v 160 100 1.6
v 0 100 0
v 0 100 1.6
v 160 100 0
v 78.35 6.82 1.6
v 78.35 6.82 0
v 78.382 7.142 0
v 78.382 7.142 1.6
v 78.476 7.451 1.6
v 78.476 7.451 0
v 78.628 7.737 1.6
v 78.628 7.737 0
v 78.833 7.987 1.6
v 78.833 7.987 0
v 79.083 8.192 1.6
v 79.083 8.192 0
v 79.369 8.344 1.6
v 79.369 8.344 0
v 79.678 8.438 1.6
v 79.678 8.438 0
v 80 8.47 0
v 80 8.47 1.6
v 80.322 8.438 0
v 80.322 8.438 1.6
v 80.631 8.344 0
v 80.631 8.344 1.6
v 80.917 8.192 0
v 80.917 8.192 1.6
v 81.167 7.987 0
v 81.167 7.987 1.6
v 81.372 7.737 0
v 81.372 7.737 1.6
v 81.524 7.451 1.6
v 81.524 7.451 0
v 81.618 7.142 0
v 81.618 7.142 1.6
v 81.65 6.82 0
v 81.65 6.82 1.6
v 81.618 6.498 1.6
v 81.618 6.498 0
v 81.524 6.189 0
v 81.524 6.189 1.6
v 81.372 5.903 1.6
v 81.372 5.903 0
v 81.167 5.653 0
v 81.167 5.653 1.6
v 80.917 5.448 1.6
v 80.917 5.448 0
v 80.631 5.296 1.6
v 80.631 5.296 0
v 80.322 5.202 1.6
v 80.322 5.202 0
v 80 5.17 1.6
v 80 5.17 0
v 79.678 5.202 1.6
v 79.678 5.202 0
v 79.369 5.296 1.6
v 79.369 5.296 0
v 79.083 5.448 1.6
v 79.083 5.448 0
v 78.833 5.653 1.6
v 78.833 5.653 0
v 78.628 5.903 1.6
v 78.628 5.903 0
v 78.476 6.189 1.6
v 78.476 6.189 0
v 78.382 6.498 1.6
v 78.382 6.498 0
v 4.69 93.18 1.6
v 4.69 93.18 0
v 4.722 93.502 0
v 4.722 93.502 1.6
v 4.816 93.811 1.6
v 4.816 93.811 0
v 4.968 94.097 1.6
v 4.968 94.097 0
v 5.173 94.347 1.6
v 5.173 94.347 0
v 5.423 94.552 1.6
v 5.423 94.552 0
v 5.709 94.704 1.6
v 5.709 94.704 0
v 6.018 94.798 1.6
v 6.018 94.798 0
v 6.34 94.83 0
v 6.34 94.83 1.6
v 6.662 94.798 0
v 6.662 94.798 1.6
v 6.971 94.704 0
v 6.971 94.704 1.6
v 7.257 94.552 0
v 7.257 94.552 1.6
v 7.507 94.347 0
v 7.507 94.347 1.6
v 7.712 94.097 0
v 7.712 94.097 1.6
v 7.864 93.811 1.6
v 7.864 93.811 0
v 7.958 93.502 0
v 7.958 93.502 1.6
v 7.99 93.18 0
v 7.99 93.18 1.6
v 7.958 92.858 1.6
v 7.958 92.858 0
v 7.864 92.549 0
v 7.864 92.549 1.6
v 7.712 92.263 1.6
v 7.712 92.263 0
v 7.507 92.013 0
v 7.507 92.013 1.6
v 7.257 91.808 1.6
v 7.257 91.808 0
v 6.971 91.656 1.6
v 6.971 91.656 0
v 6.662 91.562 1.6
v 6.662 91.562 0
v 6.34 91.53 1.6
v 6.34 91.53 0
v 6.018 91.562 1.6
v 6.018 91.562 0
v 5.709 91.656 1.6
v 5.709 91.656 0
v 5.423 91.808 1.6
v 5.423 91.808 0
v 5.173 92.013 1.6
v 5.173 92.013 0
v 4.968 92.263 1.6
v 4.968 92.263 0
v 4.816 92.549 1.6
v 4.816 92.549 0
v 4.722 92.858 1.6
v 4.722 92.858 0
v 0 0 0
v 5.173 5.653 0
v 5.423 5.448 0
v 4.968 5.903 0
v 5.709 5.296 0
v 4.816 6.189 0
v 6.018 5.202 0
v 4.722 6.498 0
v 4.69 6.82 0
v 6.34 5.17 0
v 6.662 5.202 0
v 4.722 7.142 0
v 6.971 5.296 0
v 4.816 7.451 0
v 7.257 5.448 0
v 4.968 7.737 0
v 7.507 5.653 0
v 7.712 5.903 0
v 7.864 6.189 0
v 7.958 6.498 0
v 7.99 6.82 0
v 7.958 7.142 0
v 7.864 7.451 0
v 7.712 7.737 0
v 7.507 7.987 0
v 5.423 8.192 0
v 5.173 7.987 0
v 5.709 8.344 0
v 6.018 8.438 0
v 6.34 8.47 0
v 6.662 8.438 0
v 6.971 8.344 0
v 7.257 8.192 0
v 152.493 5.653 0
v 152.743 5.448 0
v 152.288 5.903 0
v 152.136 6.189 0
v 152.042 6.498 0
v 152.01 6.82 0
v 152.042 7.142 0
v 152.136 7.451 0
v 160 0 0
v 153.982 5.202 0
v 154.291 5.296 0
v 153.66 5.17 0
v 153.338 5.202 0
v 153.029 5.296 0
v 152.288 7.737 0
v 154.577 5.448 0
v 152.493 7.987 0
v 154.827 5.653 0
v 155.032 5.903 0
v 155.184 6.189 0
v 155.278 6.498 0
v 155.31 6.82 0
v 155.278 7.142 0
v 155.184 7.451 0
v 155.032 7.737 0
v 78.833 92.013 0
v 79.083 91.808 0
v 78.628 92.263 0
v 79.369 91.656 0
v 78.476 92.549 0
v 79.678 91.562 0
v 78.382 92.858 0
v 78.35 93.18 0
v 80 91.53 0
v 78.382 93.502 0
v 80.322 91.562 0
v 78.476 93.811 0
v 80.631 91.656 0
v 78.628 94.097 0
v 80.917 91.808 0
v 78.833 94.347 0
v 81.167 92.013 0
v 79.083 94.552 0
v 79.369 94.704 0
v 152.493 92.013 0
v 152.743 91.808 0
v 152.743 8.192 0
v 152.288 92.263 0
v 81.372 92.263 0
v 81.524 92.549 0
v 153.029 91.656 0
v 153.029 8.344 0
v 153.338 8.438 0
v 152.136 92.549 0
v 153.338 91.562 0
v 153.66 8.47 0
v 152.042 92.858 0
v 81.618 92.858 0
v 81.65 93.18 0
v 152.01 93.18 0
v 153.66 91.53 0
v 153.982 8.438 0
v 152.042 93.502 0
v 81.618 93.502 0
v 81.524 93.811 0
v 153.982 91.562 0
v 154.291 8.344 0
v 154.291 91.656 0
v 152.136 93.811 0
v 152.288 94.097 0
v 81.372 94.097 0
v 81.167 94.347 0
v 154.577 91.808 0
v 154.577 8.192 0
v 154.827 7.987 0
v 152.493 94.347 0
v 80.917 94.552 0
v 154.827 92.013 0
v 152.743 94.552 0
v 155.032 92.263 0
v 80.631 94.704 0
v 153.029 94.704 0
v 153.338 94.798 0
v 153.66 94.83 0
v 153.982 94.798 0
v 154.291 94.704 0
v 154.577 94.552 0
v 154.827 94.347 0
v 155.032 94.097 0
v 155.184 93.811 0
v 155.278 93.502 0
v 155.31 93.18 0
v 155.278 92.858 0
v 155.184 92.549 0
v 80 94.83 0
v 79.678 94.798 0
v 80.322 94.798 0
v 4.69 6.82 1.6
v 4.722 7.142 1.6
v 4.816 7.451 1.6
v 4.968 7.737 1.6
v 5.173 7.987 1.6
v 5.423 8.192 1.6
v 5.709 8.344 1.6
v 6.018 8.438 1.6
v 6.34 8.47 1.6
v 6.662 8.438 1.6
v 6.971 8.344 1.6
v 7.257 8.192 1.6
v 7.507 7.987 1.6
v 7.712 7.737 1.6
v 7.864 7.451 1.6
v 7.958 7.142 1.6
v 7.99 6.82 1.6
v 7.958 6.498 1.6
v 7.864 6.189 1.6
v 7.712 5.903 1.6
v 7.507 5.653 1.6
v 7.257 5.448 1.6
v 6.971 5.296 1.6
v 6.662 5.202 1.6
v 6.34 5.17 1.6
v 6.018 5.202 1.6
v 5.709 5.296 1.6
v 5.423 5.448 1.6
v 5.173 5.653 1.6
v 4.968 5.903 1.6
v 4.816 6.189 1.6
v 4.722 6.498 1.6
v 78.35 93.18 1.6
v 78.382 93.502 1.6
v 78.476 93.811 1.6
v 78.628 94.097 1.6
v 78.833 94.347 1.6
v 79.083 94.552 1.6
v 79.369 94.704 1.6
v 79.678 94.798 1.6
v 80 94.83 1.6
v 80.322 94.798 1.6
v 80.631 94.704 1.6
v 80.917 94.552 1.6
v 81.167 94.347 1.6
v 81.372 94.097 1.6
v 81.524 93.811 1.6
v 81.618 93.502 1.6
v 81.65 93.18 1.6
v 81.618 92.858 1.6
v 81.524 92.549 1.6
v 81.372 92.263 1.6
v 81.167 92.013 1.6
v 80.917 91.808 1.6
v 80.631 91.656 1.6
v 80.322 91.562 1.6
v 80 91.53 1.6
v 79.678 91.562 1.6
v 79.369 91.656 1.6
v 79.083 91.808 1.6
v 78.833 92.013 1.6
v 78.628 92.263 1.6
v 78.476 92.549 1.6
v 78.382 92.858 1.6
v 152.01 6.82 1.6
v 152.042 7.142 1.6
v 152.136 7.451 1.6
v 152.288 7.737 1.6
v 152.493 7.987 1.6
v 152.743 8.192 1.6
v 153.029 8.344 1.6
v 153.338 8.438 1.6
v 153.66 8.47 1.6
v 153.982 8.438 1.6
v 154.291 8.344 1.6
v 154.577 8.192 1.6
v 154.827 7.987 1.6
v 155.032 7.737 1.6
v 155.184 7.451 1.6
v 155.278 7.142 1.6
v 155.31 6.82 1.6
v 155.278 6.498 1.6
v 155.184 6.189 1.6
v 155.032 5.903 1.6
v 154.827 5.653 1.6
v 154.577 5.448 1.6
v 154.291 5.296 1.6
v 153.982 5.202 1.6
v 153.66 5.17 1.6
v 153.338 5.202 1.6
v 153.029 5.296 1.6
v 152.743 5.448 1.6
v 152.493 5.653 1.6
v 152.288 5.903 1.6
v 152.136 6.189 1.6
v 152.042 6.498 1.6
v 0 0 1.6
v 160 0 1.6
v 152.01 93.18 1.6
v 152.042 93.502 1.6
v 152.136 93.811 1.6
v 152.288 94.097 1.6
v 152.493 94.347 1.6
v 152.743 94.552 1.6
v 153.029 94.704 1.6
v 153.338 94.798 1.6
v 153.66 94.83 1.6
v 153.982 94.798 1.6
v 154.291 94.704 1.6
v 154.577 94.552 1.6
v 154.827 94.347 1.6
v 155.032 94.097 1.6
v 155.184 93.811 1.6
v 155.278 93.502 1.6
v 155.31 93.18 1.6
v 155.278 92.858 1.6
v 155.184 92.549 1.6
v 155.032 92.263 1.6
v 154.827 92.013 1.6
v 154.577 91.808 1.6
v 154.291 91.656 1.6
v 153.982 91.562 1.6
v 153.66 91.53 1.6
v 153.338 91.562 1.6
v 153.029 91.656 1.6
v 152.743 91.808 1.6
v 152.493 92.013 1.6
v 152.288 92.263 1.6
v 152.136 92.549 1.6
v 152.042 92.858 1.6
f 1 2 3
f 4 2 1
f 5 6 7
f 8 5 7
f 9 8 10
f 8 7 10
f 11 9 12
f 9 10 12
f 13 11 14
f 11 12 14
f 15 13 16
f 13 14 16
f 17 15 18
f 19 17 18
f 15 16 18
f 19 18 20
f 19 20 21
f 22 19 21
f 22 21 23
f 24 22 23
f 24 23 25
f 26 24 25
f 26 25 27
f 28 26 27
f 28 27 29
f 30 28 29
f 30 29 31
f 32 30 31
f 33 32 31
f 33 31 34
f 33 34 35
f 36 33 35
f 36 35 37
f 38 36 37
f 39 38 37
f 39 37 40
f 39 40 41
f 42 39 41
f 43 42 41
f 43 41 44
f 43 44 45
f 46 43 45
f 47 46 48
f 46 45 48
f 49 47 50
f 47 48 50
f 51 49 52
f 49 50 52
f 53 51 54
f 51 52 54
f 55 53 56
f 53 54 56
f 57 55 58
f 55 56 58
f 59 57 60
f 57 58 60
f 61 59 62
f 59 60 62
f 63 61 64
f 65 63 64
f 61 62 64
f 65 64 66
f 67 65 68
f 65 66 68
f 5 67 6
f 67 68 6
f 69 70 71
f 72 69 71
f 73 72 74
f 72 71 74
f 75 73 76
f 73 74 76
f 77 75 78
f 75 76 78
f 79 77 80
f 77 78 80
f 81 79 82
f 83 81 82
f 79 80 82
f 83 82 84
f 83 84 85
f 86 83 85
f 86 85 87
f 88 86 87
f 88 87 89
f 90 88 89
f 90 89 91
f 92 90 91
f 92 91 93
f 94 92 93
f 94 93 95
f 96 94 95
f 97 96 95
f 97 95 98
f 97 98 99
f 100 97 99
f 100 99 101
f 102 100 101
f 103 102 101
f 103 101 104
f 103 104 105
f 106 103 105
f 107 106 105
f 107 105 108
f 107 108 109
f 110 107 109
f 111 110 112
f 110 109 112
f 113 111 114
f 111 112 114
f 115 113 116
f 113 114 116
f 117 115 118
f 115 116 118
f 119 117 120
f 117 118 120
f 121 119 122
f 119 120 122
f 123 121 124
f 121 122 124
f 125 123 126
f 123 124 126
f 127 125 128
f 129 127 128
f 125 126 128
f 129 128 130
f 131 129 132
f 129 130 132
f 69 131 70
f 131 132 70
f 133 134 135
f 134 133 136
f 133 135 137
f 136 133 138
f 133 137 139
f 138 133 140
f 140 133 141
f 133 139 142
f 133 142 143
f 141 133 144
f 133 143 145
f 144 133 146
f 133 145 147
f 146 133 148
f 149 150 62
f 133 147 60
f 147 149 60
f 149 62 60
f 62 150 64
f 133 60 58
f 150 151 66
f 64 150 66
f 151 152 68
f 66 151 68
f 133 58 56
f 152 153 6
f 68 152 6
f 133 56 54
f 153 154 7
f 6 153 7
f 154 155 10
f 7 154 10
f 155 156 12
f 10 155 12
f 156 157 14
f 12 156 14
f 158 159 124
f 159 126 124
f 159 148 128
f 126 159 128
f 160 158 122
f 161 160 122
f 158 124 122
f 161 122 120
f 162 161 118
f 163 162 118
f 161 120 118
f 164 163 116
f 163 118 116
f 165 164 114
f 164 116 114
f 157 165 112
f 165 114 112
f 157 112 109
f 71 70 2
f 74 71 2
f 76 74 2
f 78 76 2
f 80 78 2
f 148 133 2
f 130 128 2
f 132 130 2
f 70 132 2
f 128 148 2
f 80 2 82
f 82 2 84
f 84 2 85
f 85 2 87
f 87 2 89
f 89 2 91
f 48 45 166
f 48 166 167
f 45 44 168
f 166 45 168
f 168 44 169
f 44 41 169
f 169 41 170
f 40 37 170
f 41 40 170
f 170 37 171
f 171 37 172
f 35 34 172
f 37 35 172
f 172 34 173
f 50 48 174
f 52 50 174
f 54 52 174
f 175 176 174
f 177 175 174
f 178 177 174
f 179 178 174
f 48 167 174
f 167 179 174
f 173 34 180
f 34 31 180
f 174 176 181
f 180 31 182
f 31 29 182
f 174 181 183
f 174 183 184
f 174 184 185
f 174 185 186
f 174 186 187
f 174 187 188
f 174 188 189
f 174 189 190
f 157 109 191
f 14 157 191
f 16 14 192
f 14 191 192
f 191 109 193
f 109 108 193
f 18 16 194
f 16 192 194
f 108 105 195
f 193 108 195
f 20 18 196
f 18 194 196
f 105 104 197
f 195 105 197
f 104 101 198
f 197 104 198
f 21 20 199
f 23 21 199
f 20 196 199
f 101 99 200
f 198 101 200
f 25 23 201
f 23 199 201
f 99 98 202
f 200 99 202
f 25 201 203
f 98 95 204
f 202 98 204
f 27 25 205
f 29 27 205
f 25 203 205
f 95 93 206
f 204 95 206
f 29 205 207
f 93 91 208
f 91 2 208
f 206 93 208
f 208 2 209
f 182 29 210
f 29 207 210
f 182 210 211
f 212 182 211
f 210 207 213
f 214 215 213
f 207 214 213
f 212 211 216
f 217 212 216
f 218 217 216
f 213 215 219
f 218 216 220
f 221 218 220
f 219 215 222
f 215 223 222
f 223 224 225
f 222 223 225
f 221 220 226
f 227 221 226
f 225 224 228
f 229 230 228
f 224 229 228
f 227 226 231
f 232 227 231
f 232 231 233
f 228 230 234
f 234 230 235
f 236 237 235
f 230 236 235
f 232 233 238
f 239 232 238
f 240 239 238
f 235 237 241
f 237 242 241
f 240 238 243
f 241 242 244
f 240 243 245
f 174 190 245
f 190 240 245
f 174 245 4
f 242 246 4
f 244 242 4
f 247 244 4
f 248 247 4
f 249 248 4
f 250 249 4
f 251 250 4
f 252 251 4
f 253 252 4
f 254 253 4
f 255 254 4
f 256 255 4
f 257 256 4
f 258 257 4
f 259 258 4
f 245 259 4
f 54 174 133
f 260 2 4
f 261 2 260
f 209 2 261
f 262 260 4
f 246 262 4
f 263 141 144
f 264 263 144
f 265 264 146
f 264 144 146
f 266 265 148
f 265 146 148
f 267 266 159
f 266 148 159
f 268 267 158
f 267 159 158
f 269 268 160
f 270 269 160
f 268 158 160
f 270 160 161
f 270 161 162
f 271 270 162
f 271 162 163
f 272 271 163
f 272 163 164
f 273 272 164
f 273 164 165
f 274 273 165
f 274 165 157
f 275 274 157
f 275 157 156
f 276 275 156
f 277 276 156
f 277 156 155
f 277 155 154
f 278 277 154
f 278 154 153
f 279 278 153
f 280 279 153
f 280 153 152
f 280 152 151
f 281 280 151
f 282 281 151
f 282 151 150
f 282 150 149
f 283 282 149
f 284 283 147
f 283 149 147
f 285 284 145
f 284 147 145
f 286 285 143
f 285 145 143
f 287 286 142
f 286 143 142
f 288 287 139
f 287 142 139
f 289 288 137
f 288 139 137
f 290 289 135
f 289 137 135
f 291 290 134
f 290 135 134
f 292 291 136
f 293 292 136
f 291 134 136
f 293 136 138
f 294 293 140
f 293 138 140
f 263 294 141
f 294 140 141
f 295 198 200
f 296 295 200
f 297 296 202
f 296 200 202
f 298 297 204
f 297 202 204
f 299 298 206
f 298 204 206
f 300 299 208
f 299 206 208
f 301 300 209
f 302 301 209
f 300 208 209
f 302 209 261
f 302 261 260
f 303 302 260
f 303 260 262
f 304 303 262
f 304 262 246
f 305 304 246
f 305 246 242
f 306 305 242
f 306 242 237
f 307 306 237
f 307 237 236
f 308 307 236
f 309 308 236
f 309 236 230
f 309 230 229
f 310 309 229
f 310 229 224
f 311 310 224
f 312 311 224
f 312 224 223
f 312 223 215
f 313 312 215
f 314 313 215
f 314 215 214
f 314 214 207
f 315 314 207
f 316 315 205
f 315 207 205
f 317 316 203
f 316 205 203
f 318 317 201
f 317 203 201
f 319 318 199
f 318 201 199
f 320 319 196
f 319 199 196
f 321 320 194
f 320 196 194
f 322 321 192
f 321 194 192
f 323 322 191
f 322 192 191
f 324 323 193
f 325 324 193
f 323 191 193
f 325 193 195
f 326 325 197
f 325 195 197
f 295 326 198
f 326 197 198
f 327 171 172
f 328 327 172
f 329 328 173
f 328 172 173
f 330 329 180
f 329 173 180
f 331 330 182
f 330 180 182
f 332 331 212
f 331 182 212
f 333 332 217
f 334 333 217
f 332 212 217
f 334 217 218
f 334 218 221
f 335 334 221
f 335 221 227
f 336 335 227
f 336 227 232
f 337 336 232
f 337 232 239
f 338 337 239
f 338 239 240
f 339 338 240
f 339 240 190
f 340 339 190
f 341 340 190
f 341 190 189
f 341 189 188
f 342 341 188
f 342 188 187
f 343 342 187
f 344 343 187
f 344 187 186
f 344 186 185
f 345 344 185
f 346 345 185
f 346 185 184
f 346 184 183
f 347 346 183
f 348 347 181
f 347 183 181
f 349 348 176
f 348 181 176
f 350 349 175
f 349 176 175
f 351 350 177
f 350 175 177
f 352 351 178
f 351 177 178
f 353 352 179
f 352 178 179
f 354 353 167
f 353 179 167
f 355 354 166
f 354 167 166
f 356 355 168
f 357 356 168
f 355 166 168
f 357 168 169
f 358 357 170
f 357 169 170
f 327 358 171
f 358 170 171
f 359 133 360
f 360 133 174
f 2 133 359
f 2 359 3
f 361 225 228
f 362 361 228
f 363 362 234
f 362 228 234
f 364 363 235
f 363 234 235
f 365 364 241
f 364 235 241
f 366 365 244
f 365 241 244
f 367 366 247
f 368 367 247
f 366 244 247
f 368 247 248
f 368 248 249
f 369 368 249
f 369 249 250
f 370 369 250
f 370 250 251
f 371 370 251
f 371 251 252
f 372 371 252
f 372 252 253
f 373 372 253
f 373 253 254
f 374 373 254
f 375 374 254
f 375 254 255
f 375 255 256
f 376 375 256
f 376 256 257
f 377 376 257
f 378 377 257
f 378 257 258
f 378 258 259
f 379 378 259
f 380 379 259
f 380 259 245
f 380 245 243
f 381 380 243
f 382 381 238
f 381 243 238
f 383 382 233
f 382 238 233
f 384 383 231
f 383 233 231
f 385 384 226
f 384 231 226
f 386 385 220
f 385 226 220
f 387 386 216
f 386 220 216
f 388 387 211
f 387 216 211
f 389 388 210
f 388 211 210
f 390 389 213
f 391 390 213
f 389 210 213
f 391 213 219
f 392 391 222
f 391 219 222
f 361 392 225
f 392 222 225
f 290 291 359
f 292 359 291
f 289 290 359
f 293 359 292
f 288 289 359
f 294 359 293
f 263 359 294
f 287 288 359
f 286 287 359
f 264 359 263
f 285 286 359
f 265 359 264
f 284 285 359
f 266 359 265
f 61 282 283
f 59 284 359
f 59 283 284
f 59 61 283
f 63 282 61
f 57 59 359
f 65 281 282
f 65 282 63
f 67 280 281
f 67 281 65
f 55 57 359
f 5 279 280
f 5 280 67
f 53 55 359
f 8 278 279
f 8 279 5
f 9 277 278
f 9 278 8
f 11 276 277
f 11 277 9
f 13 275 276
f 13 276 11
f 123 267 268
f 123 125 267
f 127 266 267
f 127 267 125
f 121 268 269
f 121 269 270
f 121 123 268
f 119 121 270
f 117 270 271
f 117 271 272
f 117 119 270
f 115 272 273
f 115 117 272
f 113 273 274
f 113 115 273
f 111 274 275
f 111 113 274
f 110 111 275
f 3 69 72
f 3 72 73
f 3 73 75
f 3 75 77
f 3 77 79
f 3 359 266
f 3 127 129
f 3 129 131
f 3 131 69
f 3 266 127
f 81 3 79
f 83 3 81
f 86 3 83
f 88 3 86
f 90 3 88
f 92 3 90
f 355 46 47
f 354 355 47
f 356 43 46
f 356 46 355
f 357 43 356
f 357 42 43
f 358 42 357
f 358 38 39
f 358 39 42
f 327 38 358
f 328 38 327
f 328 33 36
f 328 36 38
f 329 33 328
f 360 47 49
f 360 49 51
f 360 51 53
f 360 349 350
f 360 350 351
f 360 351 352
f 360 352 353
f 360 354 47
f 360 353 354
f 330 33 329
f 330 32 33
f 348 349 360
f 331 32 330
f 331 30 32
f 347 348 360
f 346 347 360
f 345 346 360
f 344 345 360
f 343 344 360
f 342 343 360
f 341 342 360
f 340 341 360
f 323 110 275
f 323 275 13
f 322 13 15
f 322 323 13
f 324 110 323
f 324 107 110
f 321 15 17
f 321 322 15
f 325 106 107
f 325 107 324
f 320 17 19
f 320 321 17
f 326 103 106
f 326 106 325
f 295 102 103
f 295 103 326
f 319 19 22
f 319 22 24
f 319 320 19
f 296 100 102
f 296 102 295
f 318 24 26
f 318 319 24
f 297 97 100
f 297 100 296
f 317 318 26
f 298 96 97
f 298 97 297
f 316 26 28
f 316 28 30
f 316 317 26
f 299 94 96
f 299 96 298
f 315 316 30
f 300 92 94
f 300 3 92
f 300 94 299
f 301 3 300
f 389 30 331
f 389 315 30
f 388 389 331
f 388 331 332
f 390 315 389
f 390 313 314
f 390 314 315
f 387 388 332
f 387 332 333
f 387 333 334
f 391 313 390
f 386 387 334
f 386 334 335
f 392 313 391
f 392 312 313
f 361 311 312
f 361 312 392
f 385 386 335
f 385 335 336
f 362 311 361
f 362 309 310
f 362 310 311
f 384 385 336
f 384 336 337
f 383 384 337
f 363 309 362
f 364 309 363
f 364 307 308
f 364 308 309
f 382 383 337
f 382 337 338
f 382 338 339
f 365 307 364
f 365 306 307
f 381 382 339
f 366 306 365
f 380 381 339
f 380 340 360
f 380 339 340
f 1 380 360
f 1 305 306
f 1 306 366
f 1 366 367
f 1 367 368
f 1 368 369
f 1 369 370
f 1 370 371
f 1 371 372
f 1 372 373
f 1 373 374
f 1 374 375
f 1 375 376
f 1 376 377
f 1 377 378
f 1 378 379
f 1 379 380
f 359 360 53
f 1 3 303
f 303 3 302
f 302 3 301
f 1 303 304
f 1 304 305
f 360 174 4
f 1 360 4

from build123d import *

# Parameters (mm, degrees)
F0_W     = 160
F0_H     = 100
F1_DEPTH = 1.6
F3_D     = 3.3


with BuildPart() as f1:
    # F0 (on Top) → F1 (new body)
    with BuildSketch(Plane.XY):
        with Locations((80, 50)):
            Rectangle(F0_W, F0_H)
    extrude(amount=F1_DEPTH)

    # F3 (through all)
    with Locations(Plane.XY.offset(1.6)):
        with Locations((6.34, 93.18), (6.34, 6.82), (80, 6.82), (80, 93.18), (153.66, 93.18), (153.66, 6.82)):
            Hole(F3_D / 2)


solid = f1.part
